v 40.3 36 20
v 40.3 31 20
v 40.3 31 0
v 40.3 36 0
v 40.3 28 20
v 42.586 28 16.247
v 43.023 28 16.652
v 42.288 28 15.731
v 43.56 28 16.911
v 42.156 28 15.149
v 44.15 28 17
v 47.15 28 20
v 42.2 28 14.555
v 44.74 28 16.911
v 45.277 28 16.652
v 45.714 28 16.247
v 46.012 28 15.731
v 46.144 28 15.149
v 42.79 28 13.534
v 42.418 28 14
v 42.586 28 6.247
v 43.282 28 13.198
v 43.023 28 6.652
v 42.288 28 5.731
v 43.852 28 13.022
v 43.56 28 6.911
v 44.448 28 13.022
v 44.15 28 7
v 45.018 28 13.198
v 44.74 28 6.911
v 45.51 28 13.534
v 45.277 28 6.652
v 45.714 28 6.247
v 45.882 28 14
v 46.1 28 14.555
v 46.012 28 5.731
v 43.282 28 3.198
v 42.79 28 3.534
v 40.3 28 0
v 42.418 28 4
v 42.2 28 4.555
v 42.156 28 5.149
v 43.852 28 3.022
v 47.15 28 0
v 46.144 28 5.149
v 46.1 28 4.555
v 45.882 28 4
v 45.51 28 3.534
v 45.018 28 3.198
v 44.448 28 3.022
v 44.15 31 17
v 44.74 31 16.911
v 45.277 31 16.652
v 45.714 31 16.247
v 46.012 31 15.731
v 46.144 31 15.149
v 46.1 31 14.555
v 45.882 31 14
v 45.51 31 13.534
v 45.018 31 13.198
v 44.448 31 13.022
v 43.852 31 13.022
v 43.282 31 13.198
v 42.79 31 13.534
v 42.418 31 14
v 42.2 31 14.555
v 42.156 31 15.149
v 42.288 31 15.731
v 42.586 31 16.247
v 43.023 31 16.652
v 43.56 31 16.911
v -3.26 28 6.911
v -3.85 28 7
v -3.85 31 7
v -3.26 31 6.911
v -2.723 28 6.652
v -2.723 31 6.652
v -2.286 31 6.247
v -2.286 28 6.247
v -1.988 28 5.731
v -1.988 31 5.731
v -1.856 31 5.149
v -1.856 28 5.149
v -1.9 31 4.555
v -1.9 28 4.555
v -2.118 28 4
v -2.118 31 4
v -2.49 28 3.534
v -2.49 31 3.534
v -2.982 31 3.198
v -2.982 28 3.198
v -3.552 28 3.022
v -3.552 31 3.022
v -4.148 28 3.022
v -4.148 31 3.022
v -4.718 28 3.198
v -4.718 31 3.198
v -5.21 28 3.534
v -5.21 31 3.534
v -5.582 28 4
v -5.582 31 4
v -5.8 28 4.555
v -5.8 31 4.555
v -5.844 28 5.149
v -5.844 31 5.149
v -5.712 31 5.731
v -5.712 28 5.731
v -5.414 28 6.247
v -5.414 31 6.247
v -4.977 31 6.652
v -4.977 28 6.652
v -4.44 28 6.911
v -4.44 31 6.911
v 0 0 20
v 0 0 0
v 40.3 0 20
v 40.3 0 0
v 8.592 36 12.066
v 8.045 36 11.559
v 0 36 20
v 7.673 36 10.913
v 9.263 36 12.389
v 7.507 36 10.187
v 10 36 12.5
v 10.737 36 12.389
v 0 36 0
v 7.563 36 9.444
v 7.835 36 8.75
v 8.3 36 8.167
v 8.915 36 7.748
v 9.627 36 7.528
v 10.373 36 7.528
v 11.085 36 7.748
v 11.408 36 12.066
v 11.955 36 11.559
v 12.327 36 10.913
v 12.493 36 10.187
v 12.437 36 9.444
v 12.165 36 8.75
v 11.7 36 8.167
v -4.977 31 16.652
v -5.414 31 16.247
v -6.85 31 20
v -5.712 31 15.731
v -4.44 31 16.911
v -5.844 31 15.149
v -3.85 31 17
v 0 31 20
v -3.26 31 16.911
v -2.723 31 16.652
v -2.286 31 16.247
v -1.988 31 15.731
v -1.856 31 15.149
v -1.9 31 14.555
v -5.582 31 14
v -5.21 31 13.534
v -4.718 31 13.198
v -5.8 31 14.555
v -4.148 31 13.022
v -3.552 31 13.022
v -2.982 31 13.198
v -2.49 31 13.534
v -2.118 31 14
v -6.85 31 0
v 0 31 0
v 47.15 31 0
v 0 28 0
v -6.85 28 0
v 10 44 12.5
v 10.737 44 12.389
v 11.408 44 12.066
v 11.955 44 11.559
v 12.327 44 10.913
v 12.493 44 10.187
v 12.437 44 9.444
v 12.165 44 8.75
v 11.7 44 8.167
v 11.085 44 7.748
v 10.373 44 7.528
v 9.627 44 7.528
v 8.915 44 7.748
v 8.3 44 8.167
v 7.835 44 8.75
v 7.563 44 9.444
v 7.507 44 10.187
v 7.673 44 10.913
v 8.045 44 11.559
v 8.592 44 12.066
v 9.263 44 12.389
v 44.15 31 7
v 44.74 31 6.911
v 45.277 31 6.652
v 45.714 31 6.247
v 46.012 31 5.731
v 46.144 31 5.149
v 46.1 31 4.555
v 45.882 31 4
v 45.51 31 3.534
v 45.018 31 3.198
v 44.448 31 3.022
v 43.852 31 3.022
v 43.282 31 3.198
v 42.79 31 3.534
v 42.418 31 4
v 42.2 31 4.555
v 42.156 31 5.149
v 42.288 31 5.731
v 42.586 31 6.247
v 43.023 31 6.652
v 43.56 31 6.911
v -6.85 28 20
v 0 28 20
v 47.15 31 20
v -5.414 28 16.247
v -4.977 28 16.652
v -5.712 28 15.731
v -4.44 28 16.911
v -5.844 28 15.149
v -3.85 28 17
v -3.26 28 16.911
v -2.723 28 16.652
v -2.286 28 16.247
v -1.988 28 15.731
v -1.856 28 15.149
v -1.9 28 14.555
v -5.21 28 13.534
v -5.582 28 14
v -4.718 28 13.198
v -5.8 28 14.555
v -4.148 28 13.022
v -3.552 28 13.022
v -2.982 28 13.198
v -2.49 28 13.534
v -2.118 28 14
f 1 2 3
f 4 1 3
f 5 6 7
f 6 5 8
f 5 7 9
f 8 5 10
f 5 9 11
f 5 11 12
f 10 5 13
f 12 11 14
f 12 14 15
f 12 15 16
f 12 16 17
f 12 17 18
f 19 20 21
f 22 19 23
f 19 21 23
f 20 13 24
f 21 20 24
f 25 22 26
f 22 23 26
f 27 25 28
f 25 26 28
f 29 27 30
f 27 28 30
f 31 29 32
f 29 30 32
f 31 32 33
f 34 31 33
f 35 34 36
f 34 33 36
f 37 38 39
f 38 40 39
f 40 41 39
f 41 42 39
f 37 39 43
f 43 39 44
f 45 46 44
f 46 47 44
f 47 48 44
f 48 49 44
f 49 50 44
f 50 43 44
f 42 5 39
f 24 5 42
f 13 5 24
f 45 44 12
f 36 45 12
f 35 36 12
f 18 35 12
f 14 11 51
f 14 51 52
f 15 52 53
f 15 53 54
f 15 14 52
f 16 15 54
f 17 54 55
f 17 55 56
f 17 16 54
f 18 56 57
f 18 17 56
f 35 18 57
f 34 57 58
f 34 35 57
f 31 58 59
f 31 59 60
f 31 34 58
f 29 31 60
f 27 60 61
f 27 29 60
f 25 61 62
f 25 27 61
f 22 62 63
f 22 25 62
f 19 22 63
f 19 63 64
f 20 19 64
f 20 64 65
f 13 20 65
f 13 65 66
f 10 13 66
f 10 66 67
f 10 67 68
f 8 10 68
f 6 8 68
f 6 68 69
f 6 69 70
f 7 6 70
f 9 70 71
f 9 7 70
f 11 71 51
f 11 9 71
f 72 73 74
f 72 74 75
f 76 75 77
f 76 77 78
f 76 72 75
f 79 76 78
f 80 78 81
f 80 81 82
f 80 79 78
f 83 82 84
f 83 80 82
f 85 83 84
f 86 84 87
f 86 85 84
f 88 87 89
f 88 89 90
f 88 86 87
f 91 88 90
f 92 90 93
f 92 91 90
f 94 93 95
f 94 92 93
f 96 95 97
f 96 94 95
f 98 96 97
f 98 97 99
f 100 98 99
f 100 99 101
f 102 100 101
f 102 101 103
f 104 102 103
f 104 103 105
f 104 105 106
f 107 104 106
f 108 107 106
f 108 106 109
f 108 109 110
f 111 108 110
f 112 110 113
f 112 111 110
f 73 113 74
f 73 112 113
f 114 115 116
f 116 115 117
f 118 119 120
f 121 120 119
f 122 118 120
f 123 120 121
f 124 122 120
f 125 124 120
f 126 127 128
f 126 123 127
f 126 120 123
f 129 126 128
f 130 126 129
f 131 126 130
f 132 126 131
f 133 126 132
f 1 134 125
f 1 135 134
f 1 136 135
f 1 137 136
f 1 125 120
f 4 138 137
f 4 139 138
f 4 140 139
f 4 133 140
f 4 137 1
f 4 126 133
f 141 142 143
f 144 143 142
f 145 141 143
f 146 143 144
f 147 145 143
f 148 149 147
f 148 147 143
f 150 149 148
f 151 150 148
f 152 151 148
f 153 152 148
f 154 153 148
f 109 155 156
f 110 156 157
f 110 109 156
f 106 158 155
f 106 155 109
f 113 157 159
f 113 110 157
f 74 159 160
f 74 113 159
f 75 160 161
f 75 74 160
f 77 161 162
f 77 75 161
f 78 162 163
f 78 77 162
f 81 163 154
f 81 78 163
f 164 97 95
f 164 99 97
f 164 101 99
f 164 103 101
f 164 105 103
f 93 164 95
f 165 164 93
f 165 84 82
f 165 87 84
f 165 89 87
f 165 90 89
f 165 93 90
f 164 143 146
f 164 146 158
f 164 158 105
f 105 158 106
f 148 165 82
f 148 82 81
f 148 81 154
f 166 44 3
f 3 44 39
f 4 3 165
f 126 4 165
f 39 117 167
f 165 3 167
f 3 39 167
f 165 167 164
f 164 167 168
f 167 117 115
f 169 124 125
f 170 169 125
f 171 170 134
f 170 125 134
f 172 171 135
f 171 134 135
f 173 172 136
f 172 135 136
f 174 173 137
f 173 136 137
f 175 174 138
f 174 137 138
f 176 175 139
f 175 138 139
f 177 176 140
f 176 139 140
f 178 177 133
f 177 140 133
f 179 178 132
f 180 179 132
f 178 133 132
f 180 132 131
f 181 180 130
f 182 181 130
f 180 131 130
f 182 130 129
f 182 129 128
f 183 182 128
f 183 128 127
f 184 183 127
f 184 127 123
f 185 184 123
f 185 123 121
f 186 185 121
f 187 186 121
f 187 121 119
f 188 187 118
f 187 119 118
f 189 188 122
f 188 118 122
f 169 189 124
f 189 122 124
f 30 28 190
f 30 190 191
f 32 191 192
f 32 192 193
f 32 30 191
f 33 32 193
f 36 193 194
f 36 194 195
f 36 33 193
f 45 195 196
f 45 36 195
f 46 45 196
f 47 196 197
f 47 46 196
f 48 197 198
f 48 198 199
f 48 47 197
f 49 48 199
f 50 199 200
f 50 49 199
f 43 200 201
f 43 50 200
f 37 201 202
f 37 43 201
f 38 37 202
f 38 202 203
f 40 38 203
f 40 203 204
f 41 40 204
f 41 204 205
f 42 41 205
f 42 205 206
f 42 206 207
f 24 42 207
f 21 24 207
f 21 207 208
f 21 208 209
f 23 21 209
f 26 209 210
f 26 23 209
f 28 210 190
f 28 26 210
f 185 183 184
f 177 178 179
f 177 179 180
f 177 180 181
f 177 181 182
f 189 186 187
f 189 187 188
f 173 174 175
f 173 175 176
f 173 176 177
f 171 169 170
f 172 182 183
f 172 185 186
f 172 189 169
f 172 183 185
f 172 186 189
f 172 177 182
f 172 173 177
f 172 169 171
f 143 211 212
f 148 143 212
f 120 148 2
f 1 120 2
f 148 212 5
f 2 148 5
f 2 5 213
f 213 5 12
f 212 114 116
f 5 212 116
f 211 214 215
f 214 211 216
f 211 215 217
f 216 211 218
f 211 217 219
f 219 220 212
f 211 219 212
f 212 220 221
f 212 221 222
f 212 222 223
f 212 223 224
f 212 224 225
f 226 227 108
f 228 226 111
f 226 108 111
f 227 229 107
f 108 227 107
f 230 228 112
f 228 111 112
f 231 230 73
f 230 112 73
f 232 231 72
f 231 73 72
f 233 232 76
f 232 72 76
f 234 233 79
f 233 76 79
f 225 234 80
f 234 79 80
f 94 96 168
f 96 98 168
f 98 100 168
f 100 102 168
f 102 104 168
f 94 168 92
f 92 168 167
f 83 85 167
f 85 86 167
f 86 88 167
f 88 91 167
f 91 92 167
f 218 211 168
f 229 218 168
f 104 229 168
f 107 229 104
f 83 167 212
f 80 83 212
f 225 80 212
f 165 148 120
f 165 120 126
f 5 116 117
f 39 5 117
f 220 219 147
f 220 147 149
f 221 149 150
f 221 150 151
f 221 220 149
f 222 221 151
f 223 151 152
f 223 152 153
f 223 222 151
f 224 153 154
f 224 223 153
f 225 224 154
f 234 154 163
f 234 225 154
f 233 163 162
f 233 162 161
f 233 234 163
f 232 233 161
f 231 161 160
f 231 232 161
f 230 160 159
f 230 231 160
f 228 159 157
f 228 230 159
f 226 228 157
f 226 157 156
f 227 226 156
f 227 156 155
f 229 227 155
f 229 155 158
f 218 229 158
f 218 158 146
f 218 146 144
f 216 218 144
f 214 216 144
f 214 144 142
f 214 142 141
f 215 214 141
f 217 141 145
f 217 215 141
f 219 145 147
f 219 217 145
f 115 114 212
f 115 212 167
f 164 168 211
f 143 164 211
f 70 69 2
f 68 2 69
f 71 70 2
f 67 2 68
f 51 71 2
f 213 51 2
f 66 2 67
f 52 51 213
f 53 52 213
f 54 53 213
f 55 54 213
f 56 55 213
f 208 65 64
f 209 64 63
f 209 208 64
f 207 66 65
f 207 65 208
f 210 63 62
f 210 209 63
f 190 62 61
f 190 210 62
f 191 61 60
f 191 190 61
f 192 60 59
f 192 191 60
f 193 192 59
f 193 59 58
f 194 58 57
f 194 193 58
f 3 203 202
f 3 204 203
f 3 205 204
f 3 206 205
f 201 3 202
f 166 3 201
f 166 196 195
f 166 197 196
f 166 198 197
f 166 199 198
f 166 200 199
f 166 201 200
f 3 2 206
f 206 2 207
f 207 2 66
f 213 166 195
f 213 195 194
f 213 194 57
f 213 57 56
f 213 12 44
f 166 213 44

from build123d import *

# Parameters (mm, degrees)
SKETCH1_W           = 40.3
SKETCH1_H           = 20
BOSS_EXTRUDE1_DEPTH = 28
SKETCH2_R           = 2
BOSS_EXTRUDE2_DEPTH = 3
SKETCH3_W           = 40.3
SKETCH3_H           = 20
BOSS_EXTRUDE3_DEPTH = 8
SKETCH4_R           = 2.5
BOSS_EXTRUDE4_DEPTH = 8


with BuildPart() as part:
    # Sketch1 → Boss-Extrude1 (new body)
    with BuildSketch(Plane(origin=(0, 0, 0), x_dir=(1, 0, 0), z_dir=(0, 1, 0))):
        with Locations((20.15, -10)):
            Rectangle(SKETCH1_W, SKETCH1_H)
    extrude(amount=BOSS_EXTRUDE1_DEPTH)

    # Sketch2 → Boss-Extrude2 (add)
    with BuildSketch(Plane(origin=(0, 28, 0), x_dir=(1, 0, 0), z_dir=(0, 1, 0))):
        Polygon((20.15, 0), (-6.85, 0), (-6.85, -20), (20.15, -20), (47.15, -20), (47.15, 0), align=None)
        with Locations(Location((-3.85, -5, 0), (0, 0, 270))):
            Circle(SKETCH2_R, mode=Mode.SUBTRACT)
        with Locations(Location((-3.85, -15, 0), (0, 0, 270))):
            Circle(SKETCH2_R, mode=Mode.SUBTRACT)
        with Locations(Location((44.15, -5, 0), (0, 0, 270))):
            Circle(SKETCH2_R, mode=Mode.SUBTRACT)
        with Locations(Location((44.15, -15, 0), (0, 0, 270))):
            Circle(SKETCH2_R, mode=Mode.SUBTRACT)
    extrude(amount=BOSS_EXTRUDE2_DEPTH)

    # Sketch3 → Boss-Extrude3 (add)
    with BuildSketch(Plane(origin=(0, 28, 0), x_dir=(1, 0, 0), z_dir=(0, 1, 0))):
        with Locations((20.15, -10)):
            Rectangle(SKETCH3_W, SKETCH3_H)
    extrude(amount=BOSS_EXTRUDE3_DEPTH)

    # Sketch4 → Boss-Extrude4 (add)
    with BuildSketch(Plane(origin=(0, 36, 0), x_dir=(1, 0, 0), z_dir=(0, 1, 0))):
        with Locations(Location((10, -10, 0), (0, 0, 270))):
            Circle(SKETCH4_R)
    extrude(amount=BOSS_EXTRUDE4_DEPTH)


solid = part.part
